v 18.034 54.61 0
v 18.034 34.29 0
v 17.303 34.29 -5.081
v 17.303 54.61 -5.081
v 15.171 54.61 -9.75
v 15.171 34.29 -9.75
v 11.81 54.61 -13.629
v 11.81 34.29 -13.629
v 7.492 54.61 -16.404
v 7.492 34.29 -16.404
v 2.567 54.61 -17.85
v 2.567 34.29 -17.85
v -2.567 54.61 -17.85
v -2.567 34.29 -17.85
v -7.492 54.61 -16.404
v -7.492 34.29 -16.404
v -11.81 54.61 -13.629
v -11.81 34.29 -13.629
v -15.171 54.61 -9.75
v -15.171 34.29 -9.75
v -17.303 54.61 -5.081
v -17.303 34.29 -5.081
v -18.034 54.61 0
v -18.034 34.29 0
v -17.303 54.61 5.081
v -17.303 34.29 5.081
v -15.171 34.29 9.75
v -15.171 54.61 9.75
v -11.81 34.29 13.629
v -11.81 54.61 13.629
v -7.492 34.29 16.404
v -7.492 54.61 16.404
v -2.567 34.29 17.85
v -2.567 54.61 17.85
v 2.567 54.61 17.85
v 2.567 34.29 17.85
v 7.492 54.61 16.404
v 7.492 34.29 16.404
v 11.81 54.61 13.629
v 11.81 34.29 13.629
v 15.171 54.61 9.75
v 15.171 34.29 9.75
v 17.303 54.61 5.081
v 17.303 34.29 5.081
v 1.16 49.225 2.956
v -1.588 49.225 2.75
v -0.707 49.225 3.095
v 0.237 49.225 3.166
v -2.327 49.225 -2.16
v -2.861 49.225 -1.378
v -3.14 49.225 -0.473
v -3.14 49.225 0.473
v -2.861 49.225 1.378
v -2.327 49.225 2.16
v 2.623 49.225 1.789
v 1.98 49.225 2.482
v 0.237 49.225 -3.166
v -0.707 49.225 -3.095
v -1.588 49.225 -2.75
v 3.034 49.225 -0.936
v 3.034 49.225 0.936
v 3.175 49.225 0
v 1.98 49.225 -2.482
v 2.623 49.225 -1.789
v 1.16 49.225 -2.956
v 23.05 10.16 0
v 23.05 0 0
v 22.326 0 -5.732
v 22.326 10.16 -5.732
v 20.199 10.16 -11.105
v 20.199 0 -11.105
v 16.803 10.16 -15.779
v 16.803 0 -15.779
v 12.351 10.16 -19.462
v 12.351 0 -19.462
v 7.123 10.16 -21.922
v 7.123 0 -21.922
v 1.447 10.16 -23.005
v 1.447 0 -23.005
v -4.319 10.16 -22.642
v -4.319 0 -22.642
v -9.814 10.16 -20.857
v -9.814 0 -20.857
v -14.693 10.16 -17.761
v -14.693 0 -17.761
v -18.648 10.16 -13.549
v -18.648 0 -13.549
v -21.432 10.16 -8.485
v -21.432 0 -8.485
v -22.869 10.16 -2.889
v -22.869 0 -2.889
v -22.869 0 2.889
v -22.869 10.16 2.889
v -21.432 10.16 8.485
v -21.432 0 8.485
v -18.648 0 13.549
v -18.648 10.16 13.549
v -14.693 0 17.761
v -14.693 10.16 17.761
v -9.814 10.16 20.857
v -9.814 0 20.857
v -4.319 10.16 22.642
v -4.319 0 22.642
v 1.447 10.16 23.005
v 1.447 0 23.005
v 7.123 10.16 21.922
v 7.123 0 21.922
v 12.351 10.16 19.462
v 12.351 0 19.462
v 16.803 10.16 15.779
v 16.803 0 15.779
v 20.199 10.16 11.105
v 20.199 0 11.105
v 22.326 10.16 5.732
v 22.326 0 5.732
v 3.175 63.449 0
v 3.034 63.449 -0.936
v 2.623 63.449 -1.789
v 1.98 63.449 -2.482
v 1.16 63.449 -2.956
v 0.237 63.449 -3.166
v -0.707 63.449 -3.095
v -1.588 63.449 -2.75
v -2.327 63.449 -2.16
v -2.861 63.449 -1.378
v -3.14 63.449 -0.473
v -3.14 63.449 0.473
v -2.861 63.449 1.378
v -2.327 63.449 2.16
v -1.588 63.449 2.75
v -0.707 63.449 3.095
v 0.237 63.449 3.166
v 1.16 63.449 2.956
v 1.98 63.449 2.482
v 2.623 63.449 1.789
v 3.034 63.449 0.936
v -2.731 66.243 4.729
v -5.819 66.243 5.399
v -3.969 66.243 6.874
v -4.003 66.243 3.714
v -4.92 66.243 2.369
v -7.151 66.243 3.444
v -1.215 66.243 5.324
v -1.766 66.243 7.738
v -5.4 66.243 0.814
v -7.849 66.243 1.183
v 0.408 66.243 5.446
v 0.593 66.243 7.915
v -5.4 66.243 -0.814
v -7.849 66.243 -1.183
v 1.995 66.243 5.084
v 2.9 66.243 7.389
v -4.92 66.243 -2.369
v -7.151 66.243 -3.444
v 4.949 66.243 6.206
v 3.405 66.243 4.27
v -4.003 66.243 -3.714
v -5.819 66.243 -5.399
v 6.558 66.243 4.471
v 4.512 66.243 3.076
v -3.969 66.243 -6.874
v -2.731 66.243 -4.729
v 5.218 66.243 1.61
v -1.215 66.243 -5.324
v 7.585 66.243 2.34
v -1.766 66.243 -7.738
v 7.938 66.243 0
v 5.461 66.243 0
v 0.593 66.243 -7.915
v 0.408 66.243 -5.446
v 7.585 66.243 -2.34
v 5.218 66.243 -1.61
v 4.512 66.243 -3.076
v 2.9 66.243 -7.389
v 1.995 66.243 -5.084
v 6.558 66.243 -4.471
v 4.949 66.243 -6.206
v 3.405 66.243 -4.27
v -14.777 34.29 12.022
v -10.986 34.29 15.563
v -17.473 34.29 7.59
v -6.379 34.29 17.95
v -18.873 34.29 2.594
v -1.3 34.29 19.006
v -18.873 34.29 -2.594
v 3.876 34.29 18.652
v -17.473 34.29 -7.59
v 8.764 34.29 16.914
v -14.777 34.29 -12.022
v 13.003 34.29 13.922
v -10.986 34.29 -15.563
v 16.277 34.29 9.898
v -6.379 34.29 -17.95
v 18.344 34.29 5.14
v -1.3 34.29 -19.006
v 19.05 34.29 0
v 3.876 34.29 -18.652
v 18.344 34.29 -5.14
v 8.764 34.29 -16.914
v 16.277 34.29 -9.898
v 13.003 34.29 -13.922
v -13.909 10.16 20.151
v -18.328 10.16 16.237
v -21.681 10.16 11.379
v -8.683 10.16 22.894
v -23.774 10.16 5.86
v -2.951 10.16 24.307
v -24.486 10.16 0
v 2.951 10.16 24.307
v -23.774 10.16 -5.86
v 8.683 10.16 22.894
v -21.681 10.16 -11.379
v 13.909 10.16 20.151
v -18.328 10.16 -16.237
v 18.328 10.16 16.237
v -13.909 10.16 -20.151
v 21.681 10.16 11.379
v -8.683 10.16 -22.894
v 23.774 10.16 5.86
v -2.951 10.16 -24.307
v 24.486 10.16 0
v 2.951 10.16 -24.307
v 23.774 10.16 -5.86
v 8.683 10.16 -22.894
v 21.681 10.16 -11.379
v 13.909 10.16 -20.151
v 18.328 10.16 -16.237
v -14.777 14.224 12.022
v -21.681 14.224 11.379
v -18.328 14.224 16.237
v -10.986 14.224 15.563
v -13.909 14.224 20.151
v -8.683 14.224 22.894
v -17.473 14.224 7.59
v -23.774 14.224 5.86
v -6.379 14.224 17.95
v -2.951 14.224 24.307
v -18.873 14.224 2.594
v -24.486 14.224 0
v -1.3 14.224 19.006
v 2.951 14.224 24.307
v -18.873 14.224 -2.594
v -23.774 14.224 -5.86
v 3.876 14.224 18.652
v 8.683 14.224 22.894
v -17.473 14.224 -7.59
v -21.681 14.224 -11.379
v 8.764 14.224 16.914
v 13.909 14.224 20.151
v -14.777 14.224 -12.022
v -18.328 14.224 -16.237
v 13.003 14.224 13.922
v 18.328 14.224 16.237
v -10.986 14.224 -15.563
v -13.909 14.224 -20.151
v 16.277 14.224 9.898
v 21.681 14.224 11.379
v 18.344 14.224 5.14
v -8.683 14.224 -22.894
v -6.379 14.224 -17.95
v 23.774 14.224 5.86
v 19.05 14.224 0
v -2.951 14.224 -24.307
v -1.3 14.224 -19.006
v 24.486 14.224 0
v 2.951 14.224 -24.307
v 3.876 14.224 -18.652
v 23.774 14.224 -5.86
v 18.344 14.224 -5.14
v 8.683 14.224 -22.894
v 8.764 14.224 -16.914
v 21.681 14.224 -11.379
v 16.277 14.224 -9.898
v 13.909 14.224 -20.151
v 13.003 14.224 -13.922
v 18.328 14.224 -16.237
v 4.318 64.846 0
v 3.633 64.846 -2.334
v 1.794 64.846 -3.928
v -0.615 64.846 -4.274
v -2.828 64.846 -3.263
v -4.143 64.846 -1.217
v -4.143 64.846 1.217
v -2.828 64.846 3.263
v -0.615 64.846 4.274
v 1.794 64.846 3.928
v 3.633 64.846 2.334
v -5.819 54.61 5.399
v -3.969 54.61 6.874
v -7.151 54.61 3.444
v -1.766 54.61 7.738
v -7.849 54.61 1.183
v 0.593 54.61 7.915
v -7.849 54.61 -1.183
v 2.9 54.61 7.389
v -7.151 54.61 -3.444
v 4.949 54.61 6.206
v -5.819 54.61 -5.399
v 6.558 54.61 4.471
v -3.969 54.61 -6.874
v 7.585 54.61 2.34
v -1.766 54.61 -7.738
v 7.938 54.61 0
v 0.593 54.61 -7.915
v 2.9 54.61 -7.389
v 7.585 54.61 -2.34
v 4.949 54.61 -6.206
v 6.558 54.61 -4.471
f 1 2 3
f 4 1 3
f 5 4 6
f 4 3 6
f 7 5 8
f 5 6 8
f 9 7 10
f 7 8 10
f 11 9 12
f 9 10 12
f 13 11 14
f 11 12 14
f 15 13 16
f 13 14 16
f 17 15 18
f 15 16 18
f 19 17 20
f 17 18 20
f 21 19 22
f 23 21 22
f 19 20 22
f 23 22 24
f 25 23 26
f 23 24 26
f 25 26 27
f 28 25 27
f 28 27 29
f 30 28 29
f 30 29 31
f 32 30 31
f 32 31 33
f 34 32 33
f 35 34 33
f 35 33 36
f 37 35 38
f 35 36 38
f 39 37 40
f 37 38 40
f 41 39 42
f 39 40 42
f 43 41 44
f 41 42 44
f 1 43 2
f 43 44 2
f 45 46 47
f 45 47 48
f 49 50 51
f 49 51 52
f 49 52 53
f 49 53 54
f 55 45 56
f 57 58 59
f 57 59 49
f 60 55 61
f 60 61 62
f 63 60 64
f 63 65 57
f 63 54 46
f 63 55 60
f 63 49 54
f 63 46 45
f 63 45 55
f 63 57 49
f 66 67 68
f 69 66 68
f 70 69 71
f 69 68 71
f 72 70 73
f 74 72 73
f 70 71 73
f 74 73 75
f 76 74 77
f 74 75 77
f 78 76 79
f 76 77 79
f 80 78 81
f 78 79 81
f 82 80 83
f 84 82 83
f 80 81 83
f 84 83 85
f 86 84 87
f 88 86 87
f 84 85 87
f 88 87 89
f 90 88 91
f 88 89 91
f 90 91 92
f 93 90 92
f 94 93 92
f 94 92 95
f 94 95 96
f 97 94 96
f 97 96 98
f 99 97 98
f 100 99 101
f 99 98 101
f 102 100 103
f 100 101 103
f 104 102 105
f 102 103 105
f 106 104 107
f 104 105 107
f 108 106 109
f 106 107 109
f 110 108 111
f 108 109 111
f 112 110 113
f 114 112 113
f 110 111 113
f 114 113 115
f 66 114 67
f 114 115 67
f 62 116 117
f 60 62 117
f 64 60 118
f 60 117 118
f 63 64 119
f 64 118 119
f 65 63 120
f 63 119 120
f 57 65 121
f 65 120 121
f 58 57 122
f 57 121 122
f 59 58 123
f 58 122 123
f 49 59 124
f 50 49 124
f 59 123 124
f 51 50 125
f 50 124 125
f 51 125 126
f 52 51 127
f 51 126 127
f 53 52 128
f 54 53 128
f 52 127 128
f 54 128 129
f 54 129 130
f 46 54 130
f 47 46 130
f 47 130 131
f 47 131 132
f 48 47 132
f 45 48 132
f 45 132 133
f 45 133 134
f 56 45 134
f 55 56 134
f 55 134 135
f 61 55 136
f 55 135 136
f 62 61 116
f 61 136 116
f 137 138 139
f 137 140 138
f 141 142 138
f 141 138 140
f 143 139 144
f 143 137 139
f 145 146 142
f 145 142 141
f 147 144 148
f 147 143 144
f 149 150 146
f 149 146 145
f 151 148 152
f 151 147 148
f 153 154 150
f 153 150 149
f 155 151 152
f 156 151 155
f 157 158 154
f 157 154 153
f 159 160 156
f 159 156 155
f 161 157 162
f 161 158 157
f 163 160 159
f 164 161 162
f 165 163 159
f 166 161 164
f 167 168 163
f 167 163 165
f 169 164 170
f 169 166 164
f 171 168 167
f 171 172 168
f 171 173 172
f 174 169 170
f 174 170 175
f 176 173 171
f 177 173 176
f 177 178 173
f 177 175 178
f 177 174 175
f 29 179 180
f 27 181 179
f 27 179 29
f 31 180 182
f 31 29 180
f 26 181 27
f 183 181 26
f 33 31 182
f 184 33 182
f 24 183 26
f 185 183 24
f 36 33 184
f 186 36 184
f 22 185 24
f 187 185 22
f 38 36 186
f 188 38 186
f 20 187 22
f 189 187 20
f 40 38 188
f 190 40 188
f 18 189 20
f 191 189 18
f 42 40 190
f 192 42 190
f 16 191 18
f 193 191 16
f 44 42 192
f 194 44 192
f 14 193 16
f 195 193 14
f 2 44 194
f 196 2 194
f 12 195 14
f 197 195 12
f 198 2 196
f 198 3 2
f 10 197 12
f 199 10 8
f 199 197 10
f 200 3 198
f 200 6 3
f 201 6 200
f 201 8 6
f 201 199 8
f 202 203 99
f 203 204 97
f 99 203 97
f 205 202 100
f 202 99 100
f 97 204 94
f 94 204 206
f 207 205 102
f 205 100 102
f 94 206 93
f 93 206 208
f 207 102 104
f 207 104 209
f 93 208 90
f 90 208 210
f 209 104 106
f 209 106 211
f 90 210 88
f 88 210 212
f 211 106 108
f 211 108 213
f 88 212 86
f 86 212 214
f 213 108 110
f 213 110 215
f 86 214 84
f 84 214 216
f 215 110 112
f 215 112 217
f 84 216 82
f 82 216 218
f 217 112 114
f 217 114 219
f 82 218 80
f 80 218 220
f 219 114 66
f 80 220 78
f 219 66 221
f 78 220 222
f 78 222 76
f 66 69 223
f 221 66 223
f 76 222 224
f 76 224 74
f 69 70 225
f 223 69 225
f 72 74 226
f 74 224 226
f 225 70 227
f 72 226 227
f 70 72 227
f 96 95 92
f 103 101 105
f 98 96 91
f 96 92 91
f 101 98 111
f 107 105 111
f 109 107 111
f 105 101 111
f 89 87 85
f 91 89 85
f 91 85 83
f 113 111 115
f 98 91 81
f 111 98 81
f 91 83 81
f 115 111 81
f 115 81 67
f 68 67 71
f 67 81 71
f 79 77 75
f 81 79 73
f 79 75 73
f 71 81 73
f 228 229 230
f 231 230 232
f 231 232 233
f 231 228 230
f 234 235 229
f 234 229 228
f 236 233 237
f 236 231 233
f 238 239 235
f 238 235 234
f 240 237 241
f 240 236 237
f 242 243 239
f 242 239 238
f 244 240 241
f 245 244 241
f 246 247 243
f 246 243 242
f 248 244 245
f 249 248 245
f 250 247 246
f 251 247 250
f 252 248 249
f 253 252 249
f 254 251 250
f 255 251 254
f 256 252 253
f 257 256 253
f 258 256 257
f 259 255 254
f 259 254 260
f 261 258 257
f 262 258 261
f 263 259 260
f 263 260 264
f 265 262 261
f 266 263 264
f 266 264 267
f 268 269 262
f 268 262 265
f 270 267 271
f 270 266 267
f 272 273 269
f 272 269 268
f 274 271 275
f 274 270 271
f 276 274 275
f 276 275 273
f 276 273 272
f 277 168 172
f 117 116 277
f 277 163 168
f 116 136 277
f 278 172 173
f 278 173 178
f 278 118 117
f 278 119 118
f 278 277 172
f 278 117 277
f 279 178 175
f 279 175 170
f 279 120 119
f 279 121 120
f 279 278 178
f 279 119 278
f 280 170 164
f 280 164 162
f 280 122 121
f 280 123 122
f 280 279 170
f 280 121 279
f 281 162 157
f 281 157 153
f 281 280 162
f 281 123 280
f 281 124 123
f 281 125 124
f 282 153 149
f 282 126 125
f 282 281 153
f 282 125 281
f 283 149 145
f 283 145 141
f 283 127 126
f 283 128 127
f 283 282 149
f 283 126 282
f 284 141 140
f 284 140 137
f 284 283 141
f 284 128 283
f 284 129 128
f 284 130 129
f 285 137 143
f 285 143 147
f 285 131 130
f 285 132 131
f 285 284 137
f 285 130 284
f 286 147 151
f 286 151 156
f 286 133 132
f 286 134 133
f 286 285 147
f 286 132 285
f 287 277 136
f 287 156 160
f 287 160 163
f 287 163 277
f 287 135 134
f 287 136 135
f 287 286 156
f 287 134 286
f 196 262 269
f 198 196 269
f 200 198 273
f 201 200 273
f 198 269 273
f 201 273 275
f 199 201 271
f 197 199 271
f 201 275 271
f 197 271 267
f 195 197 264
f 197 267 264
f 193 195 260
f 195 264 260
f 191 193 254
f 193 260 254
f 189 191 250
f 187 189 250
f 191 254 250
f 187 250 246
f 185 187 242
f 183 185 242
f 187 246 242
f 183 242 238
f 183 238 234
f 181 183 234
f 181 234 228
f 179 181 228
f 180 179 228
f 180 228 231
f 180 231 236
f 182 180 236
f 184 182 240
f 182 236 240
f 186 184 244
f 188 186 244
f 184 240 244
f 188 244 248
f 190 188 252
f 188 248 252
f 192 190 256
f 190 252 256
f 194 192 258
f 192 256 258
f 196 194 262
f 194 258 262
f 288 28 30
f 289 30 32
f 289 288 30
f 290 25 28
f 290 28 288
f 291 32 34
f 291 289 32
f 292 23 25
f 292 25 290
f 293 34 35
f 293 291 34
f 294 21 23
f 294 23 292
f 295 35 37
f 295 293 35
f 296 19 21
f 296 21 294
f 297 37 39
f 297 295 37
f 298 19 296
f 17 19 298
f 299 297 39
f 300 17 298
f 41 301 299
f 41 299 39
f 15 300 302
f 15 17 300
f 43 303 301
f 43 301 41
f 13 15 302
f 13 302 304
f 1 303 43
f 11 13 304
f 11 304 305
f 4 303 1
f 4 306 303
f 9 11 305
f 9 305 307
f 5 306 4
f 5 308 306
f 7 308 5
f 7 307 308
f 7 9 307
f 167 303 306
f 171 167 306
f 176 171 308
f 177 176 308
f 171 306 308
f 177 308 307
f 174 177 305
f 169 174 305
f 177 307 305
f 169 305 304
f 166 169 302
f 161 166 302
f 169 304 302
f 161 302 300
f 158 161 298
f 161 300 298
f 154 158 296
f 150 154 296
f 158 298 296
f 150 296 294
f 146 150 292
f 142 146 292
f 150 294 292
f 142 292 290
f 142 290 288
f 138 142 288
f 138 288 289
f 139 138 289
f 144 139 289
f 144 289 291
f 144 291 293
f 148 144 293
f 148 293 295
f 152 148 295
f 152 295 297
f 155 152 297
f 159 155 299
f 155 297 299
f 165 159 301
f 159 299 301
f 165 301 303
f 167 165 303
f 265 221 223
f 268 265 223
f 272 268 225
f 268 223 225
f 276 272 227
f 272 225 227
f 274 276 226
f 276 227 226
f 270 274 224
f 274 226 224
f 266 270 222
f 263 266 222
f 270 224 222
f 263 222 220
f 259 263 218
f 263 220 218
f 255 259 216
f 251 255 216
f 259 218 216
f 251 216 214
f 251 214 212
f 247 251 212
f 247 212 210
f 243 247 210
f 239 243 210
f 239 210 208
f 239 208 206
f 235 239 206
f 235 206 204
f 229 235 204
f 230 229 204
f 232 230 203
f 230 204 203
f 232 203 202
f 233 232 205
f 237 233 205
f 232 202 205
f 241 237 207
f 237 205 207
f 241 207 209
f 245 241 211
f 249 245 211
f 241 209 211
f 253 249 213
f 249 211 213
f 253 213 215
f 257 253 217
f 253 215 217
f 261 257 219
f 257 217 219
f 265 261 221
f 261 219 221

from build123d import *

# Parameters (mm, degrees)
SKETCH1_R           = 23.0505
BOSS_EXTRUDE1_DEPTH = 10.16
SKETCH2_R           = 24.4856
BOSS_EXTRUDE2_DEPTH = 4.064
SKETCH3_R           = 19.05
BOSS_EXTRUDE3_DEPTH = 20.066
SKETCH4_R           = 18.034
BOSS_EXTRUDE4_DEPTH = 20.32
SKETCH5_R           = 7.9375
BOSS_EXTRUDE5_DEPTH = 11.6332
SKETCH7_R           = 3.175
CUT_EXTRUDE1_DEPTH  = 17.018
CHAMFER1_SIZE       = 2.286
CHAMFER1_SIZE2      = 2.794


with BuildPart() as part:
    # Sketch1 → Boss-Extrude1 (new body)
    with BuildSketch(Plane(origin=(0, 0, 0), x_dir=(1, 0, 0), z_dir=(0, 1, 0))):
        Circle(SKETCH1_R)
    extrude(amount=BOSS_EXTRUDE1_DEPTH)

    # Sketch2 → Boss-Extrude2 (add)
    with BuildSketch(Plane(origin=(0, 10.16, 0), x_dir=(1, 0, 0), z_dir=(0, 1, 0))):
        Circle(SKETCH2_R)
    extrude(amount=BOSS_EXTRUDE2_DEPTH)

    # Sketch3 → Boss-Extrude3 (add)
    with BuildSketch(Plane(origin=(0, 14.224, 0), x_dir=(1, 0, 0), z_dir=(0, 1, 0))):
        Circle(SKETCH3_R)
    extrude(amount=BOSS_EXTRUDE3_DEPTH)

    # Sketch4 → Boss-Extrude4 (add)
    with BuildSketch(Plane(origin=(0, 34.29, 0), x_dir=(1, 0, 0), z_dir=(0, 1, 0))):
        Circle(SKETCH4_R)
    extrude(amount=BOSS_EXTRUDE4_DEPTH)

    # Sketch5 → Boss-Extrude5 (add)
    with BuildSketch(Plane(origin=(0, 54.61, 0), x_dir=(1, 0, 0), z_dir=(0, 1, 0))):
        Circle(SKETCH5_R)
    extrude(amount=BOSS_EXTRUDE5_DEPTH)

    # Sketch7 → Cut-Extrude1 (cut)
    with BuildSketch(Plane(origin=(0, 66.2432, 0), x_dir=(1, 0, 0), z_dir=(0, 1, 0))):
        Circle(SKETCH7_R)
    extrude(amount=-CUT_EXTRUDE1_DEPTH, mode=Mode.SUBTRACT)

    # Chamfer1
    chamfer1_edges = [part.edges().sort_by_distance(p)[0] for p in [
        (-3.175, 66.2432, 0),
    ]]
    chamfer1_side = [part.faces().sort_by_distance(p)[0] for p in [
        (-7.712993597, 66.2432, 0),
    ]]
    chamfer(chamfer1_edges, length=CHAMFER1_SIZE, length2=CHAMFER1_SIZE2, reference=chamfer1_side[0])


solid = part.part
